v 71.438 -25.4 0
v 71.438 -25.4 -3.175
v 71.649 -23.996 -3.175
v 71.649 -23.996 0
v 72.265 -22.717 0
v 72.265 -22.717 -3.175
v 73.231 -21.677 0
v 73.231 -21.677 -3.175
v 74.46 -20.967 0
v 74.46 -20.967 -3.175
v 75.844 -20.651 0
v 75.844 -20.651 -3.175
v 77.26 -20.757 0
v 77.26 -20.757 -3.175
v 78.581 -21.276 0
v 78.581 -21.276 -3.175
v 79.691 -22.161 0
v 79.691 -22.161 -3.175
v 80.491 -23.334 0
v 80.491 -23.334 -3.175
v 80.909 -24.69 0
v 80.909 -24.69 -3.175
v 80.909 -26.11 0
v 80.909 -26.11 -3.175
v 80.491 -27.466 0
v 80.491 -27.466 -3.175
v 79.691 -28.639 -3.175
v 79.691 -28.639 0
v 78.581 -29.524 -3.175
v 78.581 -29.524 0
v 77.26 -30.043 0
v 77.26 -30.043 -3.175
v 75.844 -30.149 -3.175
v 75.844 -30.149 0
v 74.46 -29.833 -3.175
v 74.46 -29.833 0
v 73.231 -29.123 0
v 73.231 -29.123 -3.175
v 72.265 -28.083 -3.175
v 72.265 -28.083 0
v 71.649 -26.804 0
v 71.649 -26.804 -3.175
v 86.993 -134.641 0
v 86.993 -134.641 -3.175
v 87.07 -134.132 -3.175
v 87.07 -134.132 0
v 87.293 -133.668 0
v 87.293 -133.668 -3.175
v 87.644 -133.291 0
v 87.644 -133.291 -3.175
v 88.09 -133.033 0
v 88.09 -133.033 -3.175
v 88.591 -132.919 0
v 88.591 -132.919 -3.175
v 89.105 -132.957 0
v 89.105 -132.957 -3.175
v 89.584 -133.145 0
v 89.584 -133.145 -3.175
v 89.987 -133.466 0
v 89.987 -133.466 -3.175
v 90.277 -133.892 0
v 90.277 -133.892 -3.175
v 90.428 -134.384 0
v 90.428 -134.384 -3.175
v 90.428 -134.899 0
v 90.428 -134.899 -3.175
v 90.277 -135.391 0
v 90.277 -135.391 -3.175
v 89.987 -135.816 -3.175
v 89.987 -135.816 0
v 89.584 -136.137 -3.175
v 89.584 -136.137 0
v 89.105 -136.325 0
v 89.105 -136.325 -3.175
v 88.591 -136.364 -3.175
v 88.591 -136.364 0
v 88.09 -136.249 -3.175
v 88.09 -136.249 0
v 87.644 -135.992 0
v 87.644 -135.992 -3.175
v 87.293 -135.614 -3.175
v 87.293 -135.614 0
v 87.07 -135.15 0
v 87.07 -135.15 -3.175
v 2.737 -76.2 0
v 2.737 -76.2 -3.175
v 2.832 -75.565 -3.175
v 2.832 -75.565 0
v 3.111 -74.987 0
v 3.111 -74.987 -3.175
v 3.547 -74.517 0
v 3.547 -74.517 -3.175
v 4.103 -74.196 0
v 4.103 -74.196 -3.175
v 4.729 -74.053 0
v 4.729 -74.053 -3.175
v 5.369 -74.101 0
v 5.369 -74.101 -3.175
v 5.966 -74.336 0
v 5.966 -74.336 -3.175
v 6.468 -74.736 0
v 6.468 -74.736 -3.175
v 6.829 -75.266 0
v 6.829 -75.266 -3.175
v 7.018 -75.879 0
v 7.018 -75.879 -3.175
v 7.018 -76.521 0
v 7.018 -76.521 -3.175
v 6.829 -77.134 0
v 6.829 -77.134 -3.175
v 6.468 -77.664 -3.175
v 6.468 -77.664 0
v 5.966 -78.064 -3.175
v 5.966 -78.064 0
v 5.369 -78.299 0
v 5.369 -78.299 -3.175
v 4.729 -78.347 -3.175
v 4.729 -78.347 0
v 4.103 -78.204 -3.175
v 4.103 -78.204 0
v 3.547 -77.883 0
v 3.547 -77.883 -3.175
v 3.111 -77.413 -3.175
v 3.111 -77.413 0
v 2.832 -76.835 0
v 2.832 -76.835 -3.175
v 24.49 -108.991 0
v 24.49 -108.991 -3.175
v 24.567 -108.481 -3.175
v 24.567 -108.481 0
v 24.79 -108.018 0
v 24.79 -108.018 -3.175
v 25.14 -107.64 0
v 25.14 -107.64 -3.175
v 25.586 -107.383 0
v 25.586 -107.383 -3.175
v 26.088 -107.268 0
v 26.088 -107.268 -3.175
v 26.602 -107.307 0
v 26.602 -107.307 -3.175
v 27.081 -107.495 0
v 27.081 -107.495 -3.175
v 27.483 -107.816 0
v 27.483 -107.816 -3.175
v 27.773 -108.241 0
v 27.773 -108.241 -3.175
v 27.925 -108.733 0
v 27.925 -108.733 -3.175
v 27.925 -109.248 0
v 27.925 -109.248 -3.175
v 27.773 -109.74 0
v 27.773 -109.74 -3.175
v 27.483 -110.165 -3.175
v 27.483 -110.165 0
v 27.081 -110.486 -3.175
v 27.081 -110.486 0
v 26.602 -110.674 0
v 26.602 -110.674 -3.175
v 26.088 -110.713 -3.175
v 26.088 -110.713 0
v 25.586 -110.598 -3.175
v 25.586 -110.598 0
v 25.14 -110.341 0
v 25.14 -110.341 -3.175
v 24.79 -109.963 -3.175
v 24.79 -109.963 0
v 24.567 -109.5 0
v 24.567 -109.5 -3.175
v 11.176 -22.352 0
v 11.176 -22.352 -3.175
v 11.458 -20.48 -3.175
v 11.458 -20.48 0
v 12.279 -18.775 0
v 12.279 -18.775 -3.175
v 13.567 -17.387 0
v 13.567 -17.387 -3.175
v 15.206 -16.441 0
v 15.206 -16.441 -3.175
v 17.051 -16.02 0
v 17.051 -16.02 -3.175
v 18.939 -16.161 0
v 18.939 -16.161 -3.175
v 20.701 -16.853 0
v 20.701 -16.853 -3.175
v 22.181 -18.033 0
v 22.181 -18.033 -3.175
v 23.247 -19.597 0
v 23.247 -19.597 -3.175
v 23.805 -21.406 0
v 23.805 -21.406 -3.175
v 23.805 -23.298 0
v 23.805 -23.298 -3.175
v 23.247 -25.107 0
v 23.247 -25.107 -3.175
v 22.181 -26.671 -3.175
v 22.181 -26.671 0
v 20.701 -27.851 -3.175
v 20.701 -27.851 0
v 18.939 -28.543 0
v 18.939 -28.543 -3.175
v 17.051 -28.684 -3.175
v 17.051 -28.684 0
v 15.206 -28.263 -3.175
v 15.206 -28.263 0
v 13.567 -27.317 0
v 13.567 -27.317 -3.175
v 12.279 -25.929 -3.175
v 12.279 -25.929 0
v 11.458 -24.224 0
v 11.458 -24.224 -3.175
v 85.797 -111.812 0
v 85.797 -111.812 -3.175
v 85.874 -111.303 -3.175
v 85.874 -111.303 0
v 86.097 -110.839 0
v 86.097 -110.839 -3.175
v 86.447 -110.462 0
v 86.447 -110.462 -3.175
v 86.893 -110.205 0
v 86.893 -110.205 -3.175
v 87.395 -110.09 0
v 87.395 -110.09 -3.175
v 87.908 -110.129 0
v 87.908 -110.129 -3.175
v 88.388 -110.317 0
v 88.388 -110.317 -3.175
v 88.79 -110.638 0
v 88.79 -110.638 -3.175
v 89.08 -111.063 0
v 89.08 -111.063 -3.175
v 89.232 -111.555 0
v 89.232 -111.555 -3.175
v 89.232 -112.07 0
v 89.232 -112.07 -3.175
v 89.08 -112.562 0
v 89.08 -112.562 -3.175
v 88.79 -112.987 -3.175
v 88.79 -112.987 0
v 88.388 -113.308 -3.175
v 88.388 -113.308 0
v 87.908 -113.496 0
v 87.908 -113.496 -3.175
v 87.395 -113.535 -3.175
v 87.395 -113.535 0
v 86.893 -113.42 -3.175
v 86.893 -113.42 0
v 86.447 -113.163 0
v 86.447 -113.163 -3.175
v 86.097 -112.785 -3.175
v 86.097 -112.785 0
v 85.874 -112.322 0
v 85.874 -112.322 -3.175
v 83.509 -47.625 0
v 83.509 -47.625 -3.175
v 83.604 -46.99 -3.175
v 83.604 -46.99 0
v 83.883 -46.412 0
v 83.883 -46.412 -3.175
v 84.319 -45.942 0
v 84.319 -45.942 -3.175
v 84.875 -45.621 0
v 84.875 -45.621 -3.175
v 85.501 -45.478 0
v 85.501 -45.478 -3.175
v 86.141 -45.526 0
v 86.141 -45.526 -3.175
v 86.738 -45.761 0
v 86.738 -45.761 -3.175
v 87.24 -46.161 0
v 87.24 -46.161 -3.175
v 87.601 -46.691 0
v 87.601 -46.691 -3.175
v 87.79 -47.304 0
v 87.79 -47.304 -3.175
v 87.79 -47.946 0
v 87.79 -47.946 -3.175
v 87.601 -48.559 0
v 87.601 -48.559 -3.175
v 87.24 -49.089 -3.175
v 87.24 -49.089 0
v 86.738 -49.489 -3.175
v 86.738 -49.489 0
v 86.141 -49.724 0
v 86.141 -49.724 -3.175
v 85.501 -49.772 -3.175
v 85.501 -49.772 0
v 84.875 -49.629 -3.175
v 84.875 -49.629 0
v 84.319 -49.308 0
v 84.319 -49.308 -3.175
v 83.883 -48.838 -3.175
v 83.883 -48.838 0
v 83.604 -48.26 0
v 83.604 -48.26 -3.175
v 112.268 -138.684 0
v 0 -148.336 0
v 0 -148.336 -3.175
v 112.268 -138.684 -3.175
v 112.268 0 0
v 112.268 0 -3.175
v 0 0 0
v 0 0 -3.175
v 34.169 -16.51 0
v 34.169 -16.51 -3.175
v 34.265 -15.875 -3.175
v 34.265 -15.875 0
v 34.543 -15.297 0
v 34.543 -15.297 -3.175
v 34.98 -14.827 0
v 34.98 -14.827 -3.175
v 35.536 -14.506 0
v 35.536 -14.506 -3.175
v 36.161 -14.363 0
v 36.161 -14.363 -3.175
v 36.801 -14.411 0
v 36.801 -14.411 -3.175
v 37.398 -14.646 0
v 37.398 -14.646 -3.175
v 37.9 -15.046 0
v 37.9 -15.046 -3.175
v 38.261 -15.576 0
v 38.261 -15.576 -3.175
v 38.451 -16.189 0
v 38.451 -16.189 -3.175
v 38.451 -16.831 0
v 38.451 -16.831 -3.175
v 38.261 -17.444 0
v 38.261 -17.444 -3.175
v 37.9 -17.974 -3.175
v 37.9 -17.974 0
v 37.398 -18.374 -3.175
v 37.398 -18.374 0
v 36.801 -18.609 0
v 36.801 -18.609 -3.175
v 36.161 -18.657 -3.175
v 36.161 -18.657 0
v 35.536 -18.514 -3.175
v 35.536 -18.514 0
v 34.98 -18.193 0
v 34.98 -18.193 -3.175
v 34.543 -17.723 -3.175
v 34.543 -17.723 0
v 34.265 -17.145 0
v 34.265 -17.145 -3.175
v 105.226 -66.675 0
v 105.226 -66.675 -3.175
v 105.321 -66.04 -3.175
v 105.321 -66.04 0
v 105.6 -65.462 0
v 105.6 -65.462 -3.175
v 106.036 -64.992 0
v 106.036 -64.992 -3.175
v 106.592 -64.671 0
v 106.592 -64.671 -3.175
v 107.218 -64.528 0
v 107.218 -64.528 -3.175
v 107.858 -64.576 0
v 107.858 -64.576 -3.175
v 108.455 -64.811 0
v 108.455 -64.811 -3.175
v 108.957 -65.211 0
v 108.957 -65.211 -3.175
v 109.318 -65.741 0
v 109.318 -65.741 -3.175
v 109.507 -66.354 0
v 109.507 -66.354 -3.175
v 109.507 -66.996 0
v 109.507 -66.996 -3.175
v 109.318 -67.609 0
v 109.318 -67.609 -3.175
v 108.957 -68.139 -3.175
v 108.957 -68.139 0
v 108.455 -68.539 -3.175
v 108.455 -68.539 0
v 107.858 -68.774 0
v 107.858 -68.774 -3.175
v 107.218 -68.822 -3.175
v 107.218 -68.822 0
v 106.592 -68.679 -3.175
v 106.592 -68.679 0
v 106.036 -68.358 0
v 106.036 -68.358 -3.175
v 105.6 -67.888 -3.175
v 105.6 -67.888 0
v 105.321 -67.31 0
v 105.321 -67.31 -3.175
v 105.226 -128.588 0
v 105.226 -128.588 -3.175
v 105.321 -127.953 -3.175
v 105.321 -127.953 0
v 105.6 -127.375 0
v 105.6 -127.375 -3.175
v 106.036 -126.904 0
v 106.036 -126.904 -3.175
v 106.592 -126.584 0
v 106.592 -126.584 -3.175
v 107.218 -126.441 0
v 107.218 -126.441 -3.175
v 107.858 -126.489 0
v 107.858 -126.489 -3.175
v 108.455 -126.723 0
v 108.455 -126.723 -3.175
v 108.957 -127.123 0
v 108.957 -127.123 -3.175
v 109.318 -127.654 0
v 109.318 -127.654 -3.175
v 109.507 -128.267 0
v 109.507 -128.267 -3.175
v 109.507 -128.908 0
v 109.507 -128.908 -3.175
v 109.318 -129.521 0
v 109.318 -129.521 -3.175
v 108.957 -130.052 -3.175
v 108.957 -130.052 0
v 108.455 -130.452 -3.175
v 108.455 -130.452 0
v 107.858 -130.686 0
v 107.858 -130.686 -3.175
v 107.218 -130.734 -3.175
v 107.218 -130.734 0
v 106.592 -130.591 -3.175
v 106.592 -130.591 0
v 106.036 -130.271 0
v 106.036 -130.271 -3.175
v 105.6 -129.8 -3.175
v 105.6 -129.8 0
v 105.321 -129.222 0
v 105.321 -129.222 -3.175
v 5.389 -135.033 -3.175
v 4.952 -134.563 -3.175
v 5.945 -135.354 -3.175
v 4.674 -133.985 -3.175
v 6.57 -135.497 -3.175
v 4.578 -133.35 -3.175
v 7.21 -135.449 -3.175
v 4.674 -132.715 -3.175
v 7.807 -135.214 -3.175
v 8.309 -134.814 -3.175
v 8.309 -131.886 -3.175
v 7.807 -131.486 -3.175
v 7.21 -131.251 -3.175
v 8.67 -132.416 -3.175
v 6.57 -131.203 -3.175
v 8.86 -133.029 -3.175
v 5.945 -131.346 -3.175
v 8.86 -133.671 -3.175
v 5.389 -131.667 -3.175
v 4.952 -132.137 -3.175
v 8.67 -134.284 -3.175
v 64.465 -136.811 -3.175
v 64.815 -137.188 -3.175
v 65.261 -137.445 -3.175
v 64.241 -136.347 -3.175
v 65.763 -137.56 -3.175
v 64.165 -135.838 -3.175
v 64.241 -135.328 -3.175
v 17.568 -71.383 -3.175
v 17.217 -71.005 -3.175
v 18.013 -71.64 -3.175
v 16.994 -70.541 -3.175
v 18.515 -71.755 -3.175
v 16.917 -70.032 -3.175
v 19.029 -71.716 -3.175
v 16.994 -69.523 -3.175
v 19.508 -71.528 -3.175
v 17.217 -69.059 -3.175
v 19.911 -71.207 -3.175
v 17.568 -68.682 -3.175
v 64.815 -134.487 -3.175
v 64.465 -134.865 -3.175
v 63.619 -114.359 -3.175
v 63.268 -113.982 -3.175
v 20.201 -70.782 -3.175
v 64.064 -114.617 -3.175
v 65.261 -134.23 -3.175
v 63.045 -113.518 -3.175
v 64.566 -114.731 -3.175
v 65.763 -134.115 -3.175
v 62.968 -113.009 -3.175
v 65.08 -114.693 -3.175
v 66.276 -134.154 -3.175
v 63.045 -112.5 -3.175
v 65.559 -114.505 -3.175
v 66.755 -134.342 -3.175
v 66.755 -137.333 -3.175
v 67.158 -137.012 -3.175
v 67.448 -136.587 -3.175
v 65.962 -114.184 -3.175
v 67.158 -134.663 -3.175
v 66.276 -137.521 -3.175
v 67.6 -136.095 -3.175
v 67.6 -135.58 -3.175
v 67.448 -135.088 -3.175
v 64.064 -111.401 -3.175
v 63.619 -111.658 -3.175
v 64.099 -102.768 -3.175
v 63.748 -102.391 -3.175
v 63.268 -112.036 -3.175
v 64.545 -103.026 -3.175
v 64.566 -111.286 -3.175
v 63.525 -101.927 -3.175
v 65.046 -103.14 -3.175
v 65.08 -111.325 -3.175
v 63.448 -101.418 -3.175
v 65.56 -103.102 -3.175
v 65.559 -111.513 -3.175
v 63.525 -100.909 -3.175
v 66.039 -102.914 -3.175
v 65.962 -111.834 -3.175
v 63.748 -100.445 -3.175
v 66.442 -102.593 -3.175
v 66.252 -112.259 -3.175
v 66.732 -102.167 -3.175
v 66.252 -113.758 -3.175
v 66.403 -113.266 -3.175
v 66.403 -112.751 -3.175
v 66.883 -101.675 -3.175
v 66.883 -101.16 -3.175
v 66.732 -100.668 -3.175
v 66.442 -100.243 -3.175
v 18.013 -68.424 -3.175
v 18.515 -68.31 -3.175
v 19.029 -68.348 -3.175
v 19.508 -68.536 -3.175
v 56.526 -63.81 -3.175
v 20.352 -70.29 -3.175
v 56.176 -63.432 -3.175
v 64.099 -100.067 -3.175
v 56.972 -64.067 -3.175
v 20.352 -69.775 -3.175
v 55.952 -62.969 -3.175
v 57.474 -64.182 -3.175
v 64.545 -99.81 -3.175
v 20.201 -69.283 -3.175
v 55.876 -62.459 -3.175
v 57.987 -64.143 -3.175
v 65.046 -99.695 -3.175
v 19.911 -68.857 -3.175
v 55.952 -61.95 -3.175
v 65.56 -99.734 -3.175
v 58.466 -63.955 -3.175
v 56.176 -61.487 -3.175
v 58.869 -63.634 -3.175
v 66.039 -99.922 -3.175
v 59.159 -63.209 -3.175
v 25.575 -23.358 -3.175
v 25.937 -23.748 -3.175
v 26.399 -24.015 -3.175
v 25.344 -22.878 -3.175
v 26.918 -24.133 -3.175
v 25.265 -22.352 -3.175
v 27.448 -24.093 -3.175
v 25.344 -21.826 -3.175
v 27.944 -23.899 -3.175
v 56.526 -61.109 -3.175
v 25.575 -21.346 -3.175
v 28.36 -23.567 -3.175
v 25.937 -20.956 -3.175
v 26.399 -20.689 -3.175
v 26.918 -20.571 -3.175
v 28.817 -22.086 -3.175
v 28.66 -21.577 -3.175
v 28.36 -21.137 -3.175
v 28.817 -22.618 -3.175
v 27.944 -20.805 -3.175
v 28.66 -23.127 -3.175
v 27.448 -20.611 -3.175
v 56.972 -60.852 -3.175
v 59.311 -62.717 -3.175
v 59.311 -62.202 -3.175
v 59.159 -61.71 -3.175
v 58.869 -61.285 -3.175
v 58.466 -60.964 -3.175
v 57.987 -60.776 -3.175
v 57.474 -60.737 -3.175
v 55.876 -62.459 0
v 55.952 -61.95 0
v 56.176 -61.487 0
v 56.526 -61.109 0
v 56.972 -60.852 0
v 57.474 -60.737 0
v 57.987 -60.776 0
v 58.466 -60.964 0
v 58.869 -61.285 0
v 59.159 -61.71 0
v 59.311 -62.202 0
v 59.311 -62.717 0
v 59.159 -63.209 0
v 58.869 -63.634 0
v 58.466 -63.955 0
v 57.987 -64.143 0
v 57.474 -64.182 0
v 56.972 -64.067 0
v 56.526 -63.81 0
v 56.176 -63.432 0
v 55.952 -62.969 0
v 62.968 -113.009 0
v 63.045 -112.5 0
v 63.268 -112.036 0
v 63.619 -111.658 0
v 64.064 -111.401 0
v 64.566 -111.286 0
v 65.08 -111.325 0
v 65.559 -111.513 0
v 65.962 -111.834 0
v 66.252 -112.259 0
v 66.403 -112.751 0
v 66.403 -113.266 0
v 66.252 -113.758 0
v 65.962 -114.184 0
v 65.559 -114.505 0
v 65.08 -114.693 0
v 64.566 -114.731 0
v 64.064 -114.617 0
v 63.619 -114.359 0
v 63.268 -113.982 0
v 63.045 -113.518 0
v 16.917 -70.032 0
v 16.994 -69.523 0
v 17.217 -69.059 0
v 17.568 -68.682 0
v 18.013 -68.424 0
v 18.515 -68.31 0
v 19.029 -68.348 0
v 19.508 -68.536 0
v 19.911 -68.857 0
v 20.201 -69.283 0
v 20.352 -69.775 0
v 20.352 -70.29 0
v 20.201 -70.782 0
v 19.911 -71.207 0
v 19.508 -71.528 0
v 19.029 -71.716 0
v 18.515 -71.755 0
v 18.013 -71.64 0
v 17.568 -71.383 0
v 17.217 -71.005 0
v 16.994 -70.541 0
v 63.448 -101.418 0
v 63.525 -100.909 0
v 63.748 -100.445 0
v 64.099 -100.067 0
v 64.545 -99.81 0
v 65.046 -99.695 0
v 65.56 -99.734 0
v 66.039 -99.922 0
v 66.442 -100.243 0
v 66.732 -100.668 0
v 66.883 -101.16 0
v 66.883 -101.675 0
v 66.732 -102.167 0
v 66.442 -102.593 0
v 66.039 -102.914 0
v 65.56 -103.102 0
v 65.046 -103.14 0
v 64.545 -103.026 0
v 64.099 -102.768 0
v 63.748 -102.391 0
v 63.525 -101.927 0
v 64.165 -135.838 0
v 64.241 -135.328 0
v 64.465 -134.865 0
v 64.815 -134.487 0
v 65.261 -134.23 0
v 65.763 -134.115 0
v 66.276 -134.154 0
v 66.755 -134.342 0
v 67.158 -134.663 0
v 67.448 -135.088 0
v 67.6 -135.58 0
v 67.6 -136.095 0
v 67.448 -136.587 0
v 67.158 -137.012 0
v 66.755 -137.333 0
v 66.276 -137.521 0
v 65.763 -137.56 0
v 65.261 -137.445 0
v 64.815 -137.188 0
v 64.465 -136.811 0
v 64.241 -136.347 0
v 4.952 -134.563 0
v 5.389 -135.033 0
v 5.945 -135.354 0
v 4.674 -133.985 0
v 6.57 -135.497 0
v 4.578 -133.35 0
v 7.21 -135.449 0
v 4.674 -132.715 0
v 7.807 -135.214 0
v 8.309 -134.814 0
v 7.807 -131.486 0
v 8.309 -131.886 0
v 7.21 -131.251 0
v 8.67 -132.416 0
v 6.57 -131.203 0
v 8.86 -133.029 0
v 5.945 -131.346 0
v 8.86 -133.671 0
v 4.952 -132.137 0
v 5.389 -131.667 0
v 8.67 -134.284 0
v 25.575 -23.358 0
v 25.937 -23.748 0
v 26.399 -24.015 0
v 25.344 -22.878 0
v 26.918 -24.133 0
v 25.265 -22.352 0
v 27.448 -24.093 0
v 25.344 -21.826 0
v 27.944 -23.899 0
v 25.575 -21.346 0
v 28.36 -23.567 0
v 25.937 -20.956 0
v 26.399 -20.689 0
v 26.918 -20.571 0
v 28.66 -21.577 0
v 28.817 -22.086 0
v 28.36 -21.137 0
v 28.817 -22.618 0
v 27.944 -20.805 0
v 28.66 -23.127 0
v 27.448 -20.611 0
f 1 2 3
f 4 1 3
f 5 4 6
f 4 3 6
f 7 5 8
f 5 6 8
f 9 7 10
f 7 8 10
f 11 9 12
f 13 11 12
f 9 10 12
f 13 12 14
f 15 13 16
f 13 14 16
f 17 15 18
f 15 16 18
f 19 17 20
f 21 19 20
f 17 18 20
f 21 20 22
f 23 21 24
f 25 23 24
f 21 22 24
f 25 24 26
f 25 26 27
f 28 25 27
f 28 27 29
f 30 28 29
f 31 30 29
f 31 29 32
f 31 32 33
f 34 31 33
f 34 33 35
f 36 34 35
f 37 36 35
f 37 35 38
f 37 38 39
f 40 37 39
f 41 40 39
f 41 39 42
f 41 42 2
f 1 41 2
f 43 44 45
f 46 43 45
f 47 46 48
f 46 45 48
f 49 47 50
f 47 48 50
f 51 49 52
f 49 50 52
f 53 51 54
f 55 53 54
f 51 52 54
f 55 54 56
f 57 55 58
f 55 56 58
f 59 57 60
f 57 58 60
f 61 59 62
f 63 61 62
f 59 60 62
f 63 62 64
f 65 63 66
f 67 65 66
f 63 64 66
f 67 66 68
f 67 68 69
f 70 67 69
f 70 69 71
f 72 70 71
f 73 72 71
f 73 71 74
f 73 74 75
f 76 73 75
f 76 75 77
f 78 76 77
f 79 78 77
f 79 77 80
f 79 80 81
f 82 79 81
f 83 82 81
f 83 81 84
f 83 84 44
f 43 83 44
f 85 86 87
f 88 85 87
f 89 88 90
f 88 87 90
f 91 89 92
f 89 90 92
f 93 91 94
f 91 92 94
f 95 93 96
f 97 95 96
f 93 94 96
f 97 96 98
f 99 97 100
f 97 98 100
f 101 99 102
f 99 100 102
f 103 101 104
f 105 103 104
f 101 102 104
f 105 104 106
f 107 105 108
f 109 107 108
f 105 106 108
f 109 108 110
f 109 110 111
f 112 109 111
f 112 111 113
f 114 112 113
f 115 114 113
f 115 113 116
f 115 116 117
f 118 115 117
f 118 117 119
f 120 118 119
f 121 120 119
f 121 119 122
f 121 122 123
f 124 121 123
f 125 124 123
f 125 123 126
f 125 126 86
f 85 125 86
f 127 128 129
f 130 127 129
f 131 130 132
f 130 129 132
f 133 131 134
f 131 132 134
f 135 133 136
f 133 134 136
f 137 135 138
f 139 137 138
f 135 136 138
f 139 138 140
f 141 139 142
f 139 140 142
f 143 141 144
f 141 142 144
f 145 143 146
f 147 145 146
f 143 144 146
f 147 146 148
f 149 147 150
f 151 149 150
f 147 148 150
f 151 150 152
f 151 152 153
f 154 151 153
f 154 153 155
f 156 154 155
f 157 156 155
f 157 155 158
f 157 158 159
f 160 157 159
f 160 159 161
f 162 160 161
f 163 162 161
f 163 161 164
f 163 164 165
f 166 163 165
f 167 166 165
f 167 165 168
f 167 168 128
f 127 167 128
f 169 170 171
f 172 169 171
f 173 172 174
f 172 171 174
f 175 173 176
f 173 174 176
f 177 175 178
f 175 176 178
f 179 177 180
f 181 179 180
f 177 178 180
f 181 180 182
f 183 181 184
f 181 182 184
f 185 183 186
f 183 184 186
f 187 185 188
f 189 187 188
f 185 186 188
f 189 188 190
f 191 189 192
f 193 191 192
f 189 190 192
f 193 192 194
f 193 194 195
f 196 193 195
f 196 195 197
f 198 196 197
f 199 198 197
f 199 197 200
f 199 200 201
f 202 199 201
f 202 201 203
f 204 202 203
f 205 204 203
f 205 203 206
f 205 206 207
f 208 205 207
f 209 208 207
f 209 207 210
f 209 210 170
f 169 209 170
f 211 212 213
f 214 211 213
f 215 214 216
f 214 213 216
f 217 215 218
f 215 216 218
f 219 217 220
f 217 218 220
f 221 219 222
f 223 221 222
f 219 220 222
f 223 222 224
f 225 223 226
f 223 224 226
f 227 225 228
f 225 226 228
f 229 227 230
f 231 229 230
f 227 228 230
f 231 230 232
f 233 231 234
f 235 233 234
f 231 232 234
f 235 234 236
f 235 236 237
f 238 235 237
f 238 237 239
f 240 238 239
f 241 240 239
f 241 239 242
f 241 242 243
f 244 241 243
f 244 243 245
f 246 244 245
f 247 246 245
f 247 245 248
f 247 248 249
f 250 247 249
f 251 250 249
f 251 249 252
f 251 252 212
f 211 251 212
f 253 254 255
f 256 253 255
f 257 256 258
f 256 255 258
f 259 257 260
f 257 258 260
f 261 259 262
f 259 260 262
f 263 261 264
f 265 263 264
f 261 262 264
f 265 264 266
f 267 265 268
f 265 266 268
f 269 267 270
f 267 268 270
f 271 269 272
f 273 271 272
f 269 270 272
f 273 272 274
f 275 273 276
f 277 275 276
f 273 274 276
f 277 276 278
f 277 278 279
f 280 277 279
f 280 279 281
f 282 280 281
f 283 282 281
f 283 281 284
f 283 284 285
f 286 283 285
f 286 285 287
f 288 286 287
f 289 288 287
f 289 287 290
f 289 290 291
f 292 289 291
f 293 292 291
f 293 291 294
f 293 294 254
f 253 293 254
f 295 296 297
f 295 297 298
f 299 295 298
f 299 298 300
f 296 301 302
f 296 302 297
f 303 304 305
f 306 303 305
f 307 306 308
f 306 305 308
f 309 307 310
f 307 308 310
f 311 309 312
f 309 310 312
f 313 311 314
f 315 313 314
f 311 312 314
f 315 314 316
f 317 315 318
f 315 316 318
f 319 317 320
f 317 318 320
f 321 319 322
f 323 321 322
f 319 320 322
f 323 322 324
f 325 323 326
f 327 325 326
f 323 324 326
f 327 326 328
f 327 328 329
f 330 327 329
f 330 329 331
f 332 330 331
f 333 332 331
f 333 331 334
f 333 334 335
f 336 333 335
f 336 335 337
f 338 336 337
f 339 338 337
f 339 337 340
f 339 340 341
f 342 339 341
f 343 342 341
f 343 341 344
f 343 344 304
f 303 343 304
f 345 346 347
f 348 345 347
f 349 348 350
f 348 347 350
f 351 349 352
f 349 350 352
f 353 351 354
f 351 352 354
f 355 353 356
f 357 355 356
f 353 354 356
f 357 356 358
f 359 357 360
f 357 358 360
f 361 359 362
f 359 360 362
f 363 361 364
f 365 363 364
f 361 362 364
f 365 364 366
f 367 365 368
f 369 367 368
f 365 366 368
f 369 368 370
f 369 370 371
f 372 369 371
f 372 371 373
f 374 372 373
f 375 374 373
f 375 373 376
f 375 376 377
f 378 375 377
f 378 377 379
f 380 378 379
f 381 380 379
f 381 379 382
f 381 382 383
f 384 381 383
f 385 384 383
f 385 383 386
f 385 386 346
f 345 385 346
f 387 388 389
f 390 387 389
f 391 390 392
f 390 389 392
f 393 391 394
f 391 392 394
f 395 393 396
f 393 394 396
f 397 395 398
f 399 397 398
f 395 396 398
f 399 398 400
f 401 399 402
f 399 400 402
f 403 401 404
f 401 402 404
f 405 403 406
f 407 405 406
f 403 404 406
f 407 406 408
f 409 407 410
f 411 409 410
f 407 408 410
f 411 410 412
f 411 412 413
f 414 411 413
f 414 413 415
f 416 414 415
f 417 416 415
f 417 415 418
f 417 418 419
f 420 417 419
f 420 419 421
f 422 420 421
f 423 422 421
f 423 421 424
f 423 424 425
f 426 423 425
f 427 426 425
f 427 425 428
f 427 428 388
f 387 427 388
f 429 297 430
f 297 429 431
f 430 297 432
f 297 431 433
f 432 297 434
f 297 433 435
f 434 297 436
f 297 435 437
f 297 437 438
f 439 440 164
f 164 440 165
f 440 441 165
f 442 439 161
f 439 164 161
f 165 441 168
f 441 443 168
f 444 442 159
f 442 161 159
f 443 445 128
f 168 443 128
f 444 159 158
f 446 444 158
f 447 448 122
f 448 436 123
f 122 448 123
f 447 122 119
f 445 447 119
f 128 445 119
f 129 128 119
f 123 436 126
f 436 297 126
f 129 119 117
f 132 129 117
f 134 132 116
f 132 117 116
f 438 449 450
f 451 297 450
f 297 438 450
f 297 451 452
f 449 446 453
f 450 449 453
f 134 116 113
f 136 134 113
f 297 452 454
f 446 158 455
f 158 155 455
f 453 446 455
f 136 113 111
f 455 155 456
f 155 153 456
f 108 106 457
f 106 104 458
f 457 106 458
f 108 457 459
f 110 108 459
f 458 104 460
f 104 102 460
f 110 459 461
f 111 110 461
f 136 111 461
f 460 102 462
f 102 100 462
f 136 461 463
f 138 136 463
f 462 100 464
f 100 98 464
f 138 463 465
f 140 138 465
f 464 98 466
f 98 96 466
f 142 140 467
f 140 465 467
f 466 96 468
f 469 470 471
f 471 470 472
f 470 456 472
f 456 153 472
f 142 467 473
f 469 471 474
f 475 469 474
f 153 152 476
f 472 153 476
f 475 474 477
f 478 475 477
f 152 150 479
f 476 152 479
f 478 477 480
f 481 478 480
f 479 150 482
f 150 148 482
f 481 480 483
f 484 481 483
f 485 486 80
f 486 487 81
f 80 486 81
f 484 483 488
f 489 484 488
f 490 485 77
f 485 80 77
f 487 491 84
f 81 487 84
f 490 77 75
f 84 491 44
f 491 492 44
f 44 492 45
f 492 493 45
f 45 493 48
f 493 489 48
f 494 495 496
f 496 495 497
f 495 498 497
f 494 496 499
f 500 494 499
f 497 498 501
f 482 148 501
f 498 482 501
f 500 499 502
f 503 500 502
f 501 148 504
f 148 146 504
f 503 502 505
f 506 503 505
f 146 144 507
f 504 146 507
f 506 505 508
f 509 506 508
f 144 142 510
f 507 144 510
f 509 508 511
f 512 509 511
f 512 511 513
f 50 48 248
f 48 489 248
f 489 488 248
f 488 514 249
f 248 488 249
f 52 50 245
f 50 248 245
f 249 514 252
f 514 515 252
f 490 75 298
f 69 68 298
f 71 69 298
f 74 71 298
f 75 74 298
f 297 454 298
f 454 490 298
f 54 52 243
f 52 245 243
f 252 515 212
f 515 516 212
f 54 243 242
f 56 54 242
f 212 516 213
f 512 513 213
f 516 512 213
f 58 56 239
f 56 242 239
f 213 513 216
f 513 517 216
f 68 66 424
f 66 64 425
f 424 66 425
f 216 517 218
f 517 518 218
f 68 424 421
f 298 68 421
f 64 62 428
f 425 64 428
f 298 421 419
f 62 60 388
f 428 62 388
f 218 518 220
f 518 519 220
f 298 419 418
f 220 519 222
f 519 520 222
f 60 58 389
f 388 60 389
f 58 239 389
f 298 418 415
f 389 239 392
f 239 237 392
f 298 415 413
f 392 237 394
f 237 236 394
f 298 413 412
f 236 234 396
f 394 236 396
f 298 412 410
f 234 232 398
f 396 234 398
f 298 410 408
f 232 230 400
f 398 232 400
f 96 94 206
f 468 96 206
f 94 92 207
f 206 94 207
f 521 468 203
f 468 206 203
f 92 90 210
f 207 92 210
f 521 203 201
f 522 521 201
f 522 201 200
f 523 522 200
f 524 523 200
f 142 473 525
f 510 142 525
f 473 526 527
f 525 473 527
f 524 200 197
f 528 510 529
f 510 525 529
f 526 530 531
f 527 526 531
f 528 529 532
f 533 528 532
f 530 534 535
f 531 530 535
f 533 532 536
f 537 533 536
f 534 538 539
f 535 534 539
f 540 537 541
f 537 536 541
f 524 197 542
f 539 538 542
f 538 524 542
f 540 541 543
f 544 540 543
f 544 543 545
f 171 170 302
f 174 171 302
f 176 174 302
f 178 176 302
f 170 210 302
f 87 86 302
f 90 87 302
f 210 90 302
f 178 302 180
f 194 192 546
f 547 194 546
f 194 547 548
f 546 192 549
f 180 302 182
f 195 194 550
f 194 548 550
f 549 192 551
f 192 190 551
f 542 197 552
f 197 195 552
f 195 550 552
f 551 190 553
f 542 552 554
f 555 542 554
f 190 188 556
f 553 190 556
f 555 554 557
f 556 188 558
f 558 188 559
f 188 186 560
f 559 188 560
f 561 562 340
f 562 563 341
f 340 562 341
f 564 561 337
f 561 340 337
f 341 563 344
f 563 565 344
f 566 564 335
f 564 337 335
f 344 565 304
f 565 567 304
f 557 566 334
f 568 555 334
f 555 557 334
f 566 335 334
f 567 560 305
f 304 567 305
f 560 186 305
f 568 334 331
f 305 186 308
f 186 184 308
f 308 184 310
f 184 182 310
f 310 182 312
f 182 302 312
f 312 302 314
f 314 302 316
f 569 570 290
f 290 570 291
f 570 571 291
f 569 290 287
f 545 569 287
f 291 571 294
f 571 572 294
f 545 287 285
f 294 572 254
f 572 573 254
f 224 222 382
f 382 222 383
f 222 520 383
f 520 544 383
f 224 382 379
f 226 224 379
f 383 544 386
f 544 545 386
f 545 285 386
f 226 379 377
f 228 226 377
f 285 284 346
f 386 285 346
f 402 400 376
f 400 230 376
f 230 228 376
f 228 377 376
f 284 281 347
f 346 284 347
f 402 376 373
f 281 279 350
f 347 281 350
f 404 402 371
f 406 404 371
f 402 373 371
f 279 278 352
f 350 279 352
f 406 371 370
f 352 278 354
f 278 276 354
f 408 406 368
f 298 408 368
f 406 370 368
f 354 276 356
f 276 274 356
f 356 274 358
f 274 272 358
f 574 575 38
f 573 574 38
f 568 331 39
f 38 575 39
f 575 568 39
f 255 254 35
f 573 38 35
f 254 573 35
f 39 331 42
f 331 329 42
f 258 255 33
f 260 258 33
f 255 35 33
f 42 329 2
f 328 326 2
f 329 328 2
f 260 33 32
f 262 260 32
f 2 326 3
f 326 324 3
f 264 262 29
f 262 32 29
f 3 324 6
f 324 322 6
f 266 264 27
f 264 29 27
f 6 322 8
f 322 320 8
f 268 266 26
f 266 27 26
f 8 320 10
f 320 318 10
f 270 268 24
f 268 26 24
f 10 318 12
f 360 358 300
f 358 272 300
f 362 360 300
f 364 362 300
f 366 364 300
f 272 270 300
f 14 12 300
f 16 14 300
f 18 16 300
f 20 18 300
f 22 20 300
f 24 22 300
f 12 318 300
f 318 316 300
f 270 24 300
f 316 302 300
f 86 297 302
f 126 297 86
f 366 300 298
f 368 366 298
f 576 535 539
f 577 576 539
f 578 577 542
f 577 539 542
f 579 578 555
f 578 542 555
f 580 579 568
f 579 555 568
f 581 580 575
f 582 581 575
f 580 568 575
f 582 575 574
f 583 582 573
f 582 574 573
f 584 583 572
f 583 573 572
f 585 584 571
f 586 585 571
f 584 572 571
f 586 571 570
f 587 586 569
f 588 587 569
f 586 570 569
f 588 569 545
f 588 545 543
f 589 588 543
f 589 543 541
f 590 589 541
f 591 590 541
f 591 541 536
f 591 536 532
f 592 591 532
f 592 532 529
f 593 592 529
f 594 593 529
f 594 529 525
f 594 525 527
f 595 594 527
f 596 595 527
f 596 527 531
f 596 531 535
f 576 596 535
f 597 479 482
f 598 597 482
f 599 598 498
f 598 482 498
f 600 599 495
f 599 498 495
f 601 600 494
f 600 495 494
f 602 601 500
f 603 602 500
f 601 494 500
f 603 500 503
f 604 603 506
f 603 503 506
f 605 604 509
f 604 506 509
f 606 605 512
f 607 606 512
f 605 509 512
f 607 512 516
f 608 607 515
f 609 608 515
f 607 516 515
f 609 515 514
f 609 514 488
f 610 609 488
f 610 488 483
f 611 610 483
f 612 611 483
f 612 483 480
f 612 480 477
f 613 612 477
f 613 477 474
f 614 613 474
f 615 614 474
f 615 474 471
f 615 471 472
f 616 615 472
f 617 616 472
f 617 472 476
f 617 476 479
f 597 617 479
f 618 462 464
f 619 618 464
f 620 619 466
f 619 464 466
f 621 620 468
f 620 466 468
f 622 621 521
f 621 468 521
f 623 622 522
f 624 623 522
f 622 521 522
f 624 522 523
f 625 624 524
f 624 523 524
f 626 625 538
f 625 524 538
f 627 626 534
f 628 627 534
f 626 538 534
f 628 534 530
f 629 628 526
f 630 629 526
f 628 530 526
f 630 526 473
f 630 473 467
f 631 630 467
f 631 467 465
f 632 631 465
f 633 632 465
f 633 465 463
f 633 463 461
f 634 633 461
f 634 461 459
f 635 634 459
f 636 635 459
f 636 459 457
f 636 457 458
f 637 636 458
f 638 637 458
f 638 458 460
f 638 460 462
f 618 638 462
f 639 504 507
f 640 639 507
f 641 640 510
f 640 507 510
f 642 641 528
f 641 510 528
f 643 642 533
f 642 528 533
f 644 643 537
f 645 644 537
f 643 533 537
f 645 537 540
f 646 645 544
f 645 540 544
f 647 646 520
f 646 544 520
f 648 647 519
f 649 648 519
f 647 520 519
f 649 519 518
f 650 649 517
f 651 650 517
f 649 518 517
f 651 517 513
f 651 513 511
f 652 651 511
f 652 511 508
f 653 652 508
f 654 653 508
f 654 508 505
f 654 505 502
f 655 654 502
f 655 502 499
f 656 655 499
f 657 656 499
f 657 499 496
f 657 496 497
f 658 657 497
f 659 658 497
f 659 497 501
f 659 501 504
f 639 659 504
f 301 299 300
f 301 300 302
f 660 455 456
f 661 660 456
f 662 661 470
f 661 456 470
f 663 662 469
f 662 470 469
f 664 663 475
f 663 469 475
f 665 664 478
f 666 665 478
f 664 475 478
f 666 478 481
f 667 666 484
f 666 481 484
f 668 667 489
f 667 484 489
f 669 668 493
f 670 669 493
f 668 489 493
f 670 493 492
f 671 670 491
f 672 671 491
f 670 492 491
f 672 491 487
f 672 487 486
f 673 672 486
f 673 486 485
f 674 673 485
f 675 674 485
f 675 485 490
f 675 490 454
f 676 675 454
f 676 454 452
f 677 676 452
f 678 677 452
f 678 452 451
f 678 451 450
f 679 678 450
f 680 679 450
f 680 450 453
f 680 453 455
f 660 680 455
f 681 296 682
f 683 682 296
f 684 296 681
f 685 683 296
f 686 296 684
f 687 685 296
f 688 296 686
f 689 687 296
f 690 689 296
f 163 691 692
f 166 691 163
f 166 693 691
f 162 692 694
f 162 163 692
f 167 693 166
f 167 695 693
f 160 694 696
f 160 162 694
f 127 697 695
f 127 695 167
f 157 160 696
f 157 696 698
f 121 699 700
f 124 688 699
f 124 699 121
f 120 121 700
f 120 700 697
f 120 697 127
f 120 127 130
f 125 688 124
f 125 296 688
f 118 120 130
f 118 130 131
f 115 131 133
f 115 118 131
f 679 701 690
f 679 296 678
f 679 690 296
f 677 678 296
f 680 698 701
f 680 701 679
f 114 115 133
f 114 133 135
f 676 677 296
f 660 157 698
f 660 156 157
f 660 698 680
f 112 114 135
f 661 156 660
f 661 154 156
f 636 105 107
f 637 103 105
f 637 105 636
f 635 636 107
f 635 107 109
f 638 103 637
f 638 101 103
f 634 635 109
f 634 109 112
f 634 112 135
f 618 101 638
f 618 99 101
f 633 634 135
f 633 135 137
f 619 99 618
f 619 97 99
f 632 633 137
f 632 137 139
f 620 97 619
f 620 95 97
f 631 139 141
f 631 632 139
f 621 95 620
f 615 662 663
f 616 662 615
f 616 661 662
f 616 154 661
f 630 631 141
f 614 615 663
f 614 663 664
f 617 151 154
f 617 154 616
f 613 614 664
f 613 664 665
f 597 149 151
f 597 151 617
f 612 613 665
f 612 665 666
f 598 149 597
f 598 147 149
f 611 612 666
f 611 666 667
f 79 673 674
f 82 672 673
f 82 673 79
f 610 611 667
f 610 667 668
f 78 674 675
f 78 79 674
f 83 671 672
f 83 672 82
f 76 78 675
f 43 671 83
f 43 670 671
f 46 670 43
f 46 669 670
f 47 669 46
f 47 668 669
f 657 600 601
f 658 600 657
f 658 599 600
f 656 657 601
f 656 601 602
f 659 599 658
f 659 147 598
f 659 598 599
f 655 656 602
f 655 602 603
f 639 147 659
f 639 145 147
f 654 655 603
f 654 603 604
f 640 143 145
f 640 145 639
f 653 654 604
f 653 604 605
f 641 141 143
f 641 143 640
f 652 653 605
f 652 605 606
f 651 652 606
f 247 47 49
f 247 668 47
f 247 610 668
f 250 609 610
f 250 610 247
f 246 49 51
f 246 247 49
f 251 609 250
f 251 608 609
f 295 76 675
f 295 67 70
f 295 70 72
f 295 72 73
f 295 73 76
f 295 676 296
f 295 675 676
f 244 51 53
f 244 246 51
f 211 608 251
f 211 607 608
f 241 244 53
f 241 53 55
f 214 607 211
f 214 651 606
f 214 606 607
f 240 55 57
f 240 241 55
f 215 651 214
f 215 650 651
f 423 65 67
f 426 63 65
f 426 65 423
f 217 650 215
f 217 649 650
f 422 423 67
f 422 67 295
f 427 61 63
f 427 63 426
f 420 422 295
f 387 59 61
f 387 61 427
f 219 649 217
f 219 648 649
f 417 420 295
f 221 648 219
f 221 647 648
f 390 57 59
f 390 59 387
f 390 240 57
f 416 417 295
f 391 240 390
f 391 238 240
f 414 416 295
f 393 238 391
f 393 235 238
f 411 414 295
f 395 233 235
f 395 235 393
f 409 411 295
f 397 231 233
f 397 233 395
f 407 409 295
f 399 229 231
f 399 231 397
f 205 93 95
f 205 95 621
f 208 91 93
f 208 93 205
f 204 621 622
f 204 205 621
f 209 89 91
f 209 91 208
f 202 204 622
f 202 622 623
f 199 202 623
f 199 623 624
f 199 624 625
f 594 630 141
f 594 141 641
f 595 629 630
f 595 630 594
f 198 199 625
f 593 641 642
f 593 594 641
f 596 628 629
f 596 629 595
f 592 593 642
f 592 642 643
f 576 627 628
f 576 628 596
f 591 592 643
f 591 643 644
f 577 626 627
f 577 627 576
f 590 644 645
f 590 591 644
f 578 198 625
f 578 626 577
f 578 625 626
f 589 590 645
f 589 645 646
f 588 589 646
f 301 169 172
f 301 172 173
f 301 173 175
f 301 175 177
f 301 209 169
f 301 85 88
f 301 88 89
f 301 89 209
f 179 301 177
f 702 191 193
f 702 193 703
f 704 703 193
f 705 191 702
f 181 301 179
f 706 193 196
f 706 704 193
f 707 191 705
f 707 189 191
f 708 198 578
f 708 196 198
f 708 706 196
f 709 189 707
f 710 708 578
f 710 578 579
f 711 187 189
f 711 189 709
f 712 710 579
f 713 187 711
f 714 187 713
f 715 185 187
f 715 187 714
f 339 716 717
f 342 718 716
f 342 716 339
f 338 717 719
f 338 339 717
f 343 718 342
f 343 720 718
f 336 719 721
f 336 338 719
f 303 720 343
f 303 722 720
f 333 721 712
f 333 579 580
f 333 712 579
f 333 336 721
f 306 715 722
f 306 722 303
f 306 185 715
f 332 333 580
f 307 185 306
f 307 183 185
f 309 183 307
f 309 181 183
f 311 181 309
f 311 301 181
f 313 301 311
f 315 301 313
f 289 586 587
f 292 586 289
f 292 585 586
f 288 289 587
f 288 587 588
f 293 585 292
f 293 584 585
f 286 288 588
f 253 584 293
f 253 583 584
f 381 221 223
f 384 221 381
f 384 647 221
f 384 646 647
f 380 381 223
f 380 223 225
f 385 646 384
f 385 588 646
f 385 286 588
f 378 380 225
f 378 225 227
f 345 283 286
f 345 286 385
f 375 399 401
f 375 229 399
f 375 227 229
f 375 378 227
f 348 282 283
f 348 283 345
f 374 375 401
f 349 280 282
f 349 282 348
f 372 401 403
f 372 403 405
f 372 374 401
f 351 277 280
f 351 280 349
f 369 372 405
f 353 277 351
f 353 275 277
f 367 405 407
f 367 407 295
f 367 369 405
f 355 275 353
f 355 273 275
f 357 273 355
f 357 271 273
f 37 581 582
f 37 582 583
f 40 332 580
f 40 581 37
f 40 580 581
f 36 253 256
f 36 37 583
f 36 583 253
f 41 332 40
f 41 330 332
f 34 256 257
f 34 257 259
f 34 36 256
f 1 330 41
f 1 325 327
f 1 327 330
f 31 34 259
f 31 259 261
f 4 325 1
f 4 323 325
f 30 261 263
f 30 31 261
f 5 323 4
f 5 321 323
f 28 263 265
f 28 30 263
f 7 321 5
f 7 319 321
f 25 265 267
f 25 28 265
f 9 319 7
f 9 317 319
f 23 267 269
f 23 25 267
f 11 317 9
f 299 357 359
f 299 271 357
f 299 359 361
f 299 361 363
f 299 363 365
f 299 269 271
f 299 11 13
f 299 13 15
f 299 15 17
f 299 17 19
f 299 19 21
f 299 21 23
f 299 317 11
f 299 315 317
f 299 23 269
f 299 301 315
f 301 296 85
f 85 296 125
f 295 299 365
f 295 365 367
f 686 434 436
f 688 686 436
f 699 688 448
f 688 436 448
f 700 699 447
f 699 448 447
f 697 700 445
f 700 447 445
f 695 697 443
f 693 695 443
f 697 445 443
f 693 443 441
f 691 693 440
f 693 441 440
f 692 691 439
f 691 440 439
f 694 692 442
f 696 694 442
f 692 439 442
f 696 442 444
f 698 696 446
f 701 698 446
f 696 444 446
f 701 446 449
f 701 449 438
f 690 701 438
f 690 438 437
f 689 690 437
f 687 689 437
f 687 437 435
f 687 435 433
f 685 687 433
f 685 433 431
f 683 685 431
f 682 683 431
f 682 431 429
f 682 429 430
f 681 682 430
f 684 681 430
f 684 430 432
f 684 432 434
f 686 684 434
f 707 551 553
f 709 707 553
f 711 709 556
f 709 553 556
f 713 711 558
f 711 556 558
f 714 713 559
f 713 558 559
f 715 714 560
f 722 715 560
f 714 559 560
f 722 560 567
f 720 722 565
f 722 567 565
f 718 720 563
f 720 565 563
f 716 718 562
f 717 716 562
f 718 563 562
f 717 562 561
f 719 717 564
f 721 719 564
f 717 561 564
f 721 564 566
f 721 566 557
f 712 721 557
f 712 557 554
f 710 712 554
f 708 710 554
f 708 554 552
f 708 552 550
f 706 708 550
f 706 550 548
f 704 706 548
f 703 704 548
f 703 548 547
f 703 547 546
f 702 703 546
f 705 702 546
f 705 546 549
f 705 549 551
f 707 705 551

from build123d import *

# Parameters (mm, degrees)
BOSS_EXTRUDE1_DEPTH             = 3.175
F_6_CLEARANCE_HOLE1_D           = 4.3053
F_4_CLEARANCE_HOLE1_D           = 3.4544
F_6_CLEARANCE_HOLE2_D           = 4.3053
F_9_64_0_14063_DIAMETER_HOLE1_D = 3.572002
F_3_8_0_375_DIAMETER_HOLE1_D    = 9.525
F_1_2_0_5_DIAMETER_HOLE1_D      = 12.7


with BuildPart() as part:
    # Sketch1 → Boss-Extrude1 (new body)
    with BuildSketch(Plane.XY):
        Polygon((112.268, 0), (0, 0), (0, -148.336), (112.268, -138.684), align=None)
    extrude(amount=-BOSS_EXTRUDE1_DEPTH)

    # #6 Clearance Hole1 (through all)
    with Locations(Plane.XY):
        with Locations((6.731, -133.35), (107.3785, -128.5875), (107.3785, -66.675), (4.8895, -76.2)):
            Hole(F_6_CLEARANCE_HOLE1_D / 2)

    # #4 Clearance Hole1 (through all)
    with Locations(Plane.XY):
        with Locations((18.644469576, -70.03220158), (57.60279842, -62.459469576), (65.175530424, -101.41779842), (26.21720158, -108.990530424), (65.891864398, -135.837535562), (88.720535562, -134.641135602), (87.524135602, -111.812464438), (64.695464438, -113.008864398)):
            Hole(F_4_CLEARANCE_HOLE1_D / 2)

    # #6 Clearance Hole2 (through all)
    with Locations(Plane.XY):
        with Locations((36.322, -16.51), (85.6615, -47.625)):
            Hole(F_6_CLEARANCE_HOLE2_D / 2)

    # 9/64 (0.14063) Diameter Hole1 (through all)
    with Locations(Plane.XY):
        with Locations((27.051, -22.352)):
            Hole(F_9_64_0_14063_DIAMETER_HOLE1_D / 2)

    # 3/8 (0.375) Diameter Hole1 (through all)
    with Locations(Plane.XY):
        with Locations((76.2, -25.4)):
            Hole(F_3_8_0_375_DIAMETER_HOLE1_D / 2)

    # 1/2 (0.5) Diameter Hole1 (through all)
    with Locations(Plane.XY):
        with Locations((17.526, -22.352)):
            Hole(F_1_2_0_5_DIAMETER_HOLE1_D / 2)


solid = part.part
